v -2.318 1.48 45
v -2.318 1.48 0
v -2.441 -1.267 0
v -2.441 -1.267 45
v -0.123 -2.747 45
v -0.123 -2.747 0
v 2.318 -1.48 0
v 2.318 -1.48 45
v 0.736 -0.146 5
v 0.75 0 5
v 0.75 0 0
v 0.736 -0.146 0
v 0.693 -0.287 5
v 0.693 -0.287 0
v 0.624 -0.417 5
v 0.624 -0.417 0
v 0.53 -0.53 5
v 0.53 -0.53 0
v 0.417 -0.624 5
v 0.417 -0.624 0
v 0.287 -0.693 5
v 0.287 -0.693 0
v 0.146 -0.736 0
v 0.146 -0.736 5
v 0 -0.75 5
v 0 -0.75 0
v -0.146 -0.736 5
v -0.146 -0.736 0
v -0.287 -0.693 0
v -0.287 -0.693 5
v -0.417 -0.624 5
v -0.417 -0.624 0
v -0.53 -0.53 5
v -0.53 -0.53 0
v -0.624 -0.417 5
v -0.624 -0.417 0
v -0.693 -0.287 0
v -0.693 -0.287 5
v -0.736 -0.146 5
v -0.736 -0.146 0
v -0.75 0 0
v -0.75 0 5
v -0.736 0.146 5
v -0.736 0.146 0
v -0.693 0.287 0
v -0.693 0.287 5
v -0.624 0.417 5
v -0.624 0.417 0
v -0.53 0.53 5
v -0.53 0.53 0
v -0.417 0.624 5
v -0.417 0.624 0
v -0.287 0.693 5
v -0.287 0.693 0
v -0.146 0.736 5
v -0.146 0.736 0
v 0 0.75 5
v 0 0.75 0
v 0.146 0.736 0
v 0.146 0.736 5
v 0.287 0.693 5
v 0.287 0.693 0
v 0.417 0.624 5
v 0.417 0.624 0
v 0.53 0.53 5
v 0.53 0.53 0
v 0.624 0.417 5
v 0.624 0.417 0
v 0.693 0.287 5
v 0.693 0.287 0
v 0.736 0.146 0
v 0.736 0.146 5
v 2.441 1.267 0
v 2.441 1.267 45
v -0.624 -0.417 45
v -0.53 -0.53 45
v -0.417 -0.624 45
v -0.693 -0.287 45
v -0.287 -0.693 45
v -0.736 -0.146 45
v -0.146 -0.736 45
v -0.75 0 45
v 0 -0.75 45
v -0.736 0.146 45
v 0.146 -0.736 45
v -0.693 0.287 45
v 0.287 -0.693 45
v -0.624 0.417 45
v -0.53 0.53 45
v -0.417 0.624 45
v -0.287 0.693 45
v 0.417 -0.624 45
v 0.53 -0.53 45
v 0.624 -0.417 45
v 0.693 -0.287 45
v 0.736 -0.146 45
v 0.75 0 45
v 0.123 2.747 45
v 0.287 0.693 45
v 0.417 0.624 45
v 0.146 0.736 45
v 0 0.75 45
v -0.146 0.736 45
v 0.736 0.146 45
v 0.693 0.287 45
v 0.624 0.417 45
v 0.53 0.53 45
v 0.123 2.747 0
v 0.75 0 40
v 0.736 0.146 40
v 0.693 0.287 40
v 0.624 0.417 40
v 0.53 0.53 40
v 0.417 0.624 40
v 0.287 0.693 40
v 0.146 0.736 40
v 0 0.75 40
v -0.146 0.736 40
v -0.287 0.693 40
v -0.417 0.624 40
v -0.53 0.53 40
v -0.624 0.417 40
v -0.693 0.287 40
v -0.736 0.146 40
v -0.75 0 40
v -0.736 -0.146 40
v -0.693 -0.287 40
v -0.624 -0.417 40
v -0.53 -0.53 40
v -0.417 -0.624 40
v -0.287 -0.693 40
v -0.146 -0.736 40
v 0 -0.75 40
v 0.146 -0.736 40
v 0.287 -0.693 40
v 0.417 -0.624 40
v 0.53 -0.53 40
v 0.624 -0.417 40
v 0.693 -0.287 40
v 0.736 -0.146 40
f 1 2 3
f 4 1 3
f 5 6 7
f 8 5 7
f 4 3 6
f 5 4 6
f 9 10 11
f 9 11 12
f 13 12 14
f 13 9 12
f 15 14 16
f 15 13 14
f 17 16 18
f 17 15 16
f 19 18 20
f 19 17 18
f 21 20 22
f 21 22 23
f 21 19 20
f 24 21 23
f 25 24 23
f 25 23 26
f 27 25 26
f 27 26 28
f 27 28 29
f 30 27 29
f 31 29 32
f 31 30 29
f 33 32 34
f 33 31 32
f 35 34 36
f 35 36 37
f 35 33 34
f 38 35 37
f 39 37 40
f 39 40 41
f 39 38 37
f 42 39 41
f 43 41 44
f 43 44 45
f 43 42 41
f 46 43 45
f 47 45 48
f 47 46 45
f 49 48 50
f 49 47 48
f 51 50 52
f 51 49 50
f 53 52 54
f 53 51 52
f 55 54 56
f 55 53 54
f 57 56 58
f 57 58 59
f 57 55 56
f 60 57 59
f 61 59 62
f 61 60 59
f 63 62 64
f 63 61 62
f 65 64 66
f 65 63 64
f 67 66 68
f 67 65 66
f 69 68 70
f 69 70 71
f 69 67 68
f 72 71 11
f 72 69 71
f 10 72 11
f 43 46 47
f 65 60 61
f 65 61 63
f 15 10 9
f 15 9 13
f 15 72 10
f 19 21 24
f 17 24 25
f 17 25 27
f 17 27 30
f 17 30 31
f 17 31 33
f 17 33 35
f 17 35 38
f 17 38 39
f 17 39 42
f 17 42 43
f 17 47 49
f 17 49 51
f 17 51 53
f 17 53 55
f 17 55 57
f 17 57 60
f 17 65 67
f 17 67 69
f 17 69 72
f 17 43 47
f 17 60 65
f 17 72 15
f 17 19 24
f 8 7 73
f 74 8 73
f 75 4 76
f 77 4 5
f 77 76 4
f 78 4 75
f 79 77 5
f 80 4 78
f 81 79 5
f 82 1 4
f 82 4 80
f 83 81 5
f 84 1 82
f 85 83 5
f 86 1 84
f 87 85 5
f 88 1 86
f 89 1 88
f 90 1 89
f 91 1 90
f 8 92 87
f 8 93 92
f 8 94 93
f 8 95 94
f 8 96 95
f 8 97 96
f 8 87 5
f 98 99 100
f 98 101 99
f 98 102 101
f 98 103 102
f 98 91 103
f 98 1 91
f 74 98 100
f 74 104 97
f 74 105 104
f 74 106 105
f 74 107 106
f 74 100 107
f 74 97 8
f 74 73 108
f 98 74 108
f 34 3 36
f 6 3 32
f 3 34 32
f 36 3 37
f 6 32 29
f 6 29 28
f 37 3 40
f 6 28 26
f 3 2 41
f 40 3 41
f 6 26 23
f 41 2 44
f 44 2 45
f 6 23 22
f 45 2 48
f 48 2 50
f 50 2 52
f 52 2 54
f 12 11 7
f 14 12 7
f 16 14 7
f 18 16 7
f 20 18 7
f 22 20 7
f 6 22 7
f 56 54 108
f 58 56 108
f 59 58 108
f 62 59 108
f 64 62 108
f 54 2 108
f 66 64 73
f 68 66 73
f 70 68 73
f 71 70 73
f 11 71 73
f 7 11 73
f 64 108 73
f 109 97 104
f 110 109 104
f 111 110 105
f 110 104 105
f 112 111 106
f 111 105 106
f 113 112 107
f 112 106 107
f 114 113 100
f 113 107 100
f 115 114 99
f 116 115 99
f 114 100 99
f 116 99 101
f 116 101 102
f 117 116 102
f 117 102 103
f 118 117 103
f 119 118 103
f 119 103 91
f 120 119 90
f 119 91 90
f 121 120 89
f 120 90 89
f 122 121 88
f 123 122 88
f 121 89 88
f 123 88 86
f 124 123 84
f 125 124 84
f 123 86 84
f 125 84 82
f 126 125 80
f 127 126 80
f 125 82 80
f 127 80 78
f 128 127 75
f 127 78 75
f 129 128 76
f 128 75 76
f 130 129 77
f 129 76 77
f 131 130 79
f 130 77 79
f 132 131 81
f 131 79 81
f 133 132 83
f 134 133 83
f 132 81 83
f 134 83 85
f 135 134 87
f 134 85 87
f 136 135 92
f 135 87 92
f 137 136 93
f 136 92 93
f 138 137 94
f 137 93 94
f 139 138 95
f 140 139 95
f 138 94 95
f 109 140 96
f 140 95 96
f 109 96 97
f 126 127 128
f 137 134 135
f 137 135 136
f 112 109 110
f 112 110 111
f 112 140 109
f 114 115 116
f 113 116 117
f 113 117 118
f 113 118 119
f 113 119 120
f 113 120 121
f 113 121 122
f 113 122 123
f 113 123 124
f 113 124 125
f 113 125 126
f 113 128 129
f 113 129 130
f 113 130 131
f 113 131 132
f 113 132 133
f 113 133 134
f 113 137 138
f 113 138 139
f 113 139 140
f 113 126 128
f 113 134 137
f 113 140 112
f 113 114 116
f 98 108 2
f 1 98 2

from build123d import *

# Parameters (mm, degrees)
BOSS_EXTRUDE1_DEPTH = 45
SKETCH2_R           = 0.75
CUT_EXTRUDE1_DEPTH  = 5
CUT_EXTRUDE2_START  = -5
SKETCH3_R           = 0.75
CUT_EXTRUDE2_DEPTH  = 5


with BuildPart() as part:
    # Sketch1 → Boss-Extrude1 (new body)
    with BuildSketch(Plane.XY):
        Polygon((2.317732159, -1.480073525), (2.440647352, 1.267178166), (0.122915193, 2.747251691), (-2.317732159, 1.480073525), (-2.440647352, -1.267178166), (-0.122915193, -2.747251691), align=None)
    extrude(amount=BOSS_EXTRUDE1_DEPTH)

    # Sketch2 → Cut-Extrude1 (cut)
    with BuildSketch(Plane.XY.offset(45)):
        Circle(SKETCH2_R)
    extrude(amount=-CUT_EXTRUDE1_DEPTH, mode=Mode.SUBTRACT)

    # Sketch3 → Cut-Extrude2 (cut)
    with BuildSketch(Plane(origin=(0, 0, 0), x_dir=(-1, 0, 0), z_dir=(0, 0, -1)).offset(CUT_EXTRUDE2_START)):
        with Locations(Location((0, 0, 0), (0, 0, 180))):
            Circle(SKETCH3_R)
    extrude(amount=CUT_EXTRUDE2_DEPTH, mode=Mode.SUBTRACT)


solid = part.part
